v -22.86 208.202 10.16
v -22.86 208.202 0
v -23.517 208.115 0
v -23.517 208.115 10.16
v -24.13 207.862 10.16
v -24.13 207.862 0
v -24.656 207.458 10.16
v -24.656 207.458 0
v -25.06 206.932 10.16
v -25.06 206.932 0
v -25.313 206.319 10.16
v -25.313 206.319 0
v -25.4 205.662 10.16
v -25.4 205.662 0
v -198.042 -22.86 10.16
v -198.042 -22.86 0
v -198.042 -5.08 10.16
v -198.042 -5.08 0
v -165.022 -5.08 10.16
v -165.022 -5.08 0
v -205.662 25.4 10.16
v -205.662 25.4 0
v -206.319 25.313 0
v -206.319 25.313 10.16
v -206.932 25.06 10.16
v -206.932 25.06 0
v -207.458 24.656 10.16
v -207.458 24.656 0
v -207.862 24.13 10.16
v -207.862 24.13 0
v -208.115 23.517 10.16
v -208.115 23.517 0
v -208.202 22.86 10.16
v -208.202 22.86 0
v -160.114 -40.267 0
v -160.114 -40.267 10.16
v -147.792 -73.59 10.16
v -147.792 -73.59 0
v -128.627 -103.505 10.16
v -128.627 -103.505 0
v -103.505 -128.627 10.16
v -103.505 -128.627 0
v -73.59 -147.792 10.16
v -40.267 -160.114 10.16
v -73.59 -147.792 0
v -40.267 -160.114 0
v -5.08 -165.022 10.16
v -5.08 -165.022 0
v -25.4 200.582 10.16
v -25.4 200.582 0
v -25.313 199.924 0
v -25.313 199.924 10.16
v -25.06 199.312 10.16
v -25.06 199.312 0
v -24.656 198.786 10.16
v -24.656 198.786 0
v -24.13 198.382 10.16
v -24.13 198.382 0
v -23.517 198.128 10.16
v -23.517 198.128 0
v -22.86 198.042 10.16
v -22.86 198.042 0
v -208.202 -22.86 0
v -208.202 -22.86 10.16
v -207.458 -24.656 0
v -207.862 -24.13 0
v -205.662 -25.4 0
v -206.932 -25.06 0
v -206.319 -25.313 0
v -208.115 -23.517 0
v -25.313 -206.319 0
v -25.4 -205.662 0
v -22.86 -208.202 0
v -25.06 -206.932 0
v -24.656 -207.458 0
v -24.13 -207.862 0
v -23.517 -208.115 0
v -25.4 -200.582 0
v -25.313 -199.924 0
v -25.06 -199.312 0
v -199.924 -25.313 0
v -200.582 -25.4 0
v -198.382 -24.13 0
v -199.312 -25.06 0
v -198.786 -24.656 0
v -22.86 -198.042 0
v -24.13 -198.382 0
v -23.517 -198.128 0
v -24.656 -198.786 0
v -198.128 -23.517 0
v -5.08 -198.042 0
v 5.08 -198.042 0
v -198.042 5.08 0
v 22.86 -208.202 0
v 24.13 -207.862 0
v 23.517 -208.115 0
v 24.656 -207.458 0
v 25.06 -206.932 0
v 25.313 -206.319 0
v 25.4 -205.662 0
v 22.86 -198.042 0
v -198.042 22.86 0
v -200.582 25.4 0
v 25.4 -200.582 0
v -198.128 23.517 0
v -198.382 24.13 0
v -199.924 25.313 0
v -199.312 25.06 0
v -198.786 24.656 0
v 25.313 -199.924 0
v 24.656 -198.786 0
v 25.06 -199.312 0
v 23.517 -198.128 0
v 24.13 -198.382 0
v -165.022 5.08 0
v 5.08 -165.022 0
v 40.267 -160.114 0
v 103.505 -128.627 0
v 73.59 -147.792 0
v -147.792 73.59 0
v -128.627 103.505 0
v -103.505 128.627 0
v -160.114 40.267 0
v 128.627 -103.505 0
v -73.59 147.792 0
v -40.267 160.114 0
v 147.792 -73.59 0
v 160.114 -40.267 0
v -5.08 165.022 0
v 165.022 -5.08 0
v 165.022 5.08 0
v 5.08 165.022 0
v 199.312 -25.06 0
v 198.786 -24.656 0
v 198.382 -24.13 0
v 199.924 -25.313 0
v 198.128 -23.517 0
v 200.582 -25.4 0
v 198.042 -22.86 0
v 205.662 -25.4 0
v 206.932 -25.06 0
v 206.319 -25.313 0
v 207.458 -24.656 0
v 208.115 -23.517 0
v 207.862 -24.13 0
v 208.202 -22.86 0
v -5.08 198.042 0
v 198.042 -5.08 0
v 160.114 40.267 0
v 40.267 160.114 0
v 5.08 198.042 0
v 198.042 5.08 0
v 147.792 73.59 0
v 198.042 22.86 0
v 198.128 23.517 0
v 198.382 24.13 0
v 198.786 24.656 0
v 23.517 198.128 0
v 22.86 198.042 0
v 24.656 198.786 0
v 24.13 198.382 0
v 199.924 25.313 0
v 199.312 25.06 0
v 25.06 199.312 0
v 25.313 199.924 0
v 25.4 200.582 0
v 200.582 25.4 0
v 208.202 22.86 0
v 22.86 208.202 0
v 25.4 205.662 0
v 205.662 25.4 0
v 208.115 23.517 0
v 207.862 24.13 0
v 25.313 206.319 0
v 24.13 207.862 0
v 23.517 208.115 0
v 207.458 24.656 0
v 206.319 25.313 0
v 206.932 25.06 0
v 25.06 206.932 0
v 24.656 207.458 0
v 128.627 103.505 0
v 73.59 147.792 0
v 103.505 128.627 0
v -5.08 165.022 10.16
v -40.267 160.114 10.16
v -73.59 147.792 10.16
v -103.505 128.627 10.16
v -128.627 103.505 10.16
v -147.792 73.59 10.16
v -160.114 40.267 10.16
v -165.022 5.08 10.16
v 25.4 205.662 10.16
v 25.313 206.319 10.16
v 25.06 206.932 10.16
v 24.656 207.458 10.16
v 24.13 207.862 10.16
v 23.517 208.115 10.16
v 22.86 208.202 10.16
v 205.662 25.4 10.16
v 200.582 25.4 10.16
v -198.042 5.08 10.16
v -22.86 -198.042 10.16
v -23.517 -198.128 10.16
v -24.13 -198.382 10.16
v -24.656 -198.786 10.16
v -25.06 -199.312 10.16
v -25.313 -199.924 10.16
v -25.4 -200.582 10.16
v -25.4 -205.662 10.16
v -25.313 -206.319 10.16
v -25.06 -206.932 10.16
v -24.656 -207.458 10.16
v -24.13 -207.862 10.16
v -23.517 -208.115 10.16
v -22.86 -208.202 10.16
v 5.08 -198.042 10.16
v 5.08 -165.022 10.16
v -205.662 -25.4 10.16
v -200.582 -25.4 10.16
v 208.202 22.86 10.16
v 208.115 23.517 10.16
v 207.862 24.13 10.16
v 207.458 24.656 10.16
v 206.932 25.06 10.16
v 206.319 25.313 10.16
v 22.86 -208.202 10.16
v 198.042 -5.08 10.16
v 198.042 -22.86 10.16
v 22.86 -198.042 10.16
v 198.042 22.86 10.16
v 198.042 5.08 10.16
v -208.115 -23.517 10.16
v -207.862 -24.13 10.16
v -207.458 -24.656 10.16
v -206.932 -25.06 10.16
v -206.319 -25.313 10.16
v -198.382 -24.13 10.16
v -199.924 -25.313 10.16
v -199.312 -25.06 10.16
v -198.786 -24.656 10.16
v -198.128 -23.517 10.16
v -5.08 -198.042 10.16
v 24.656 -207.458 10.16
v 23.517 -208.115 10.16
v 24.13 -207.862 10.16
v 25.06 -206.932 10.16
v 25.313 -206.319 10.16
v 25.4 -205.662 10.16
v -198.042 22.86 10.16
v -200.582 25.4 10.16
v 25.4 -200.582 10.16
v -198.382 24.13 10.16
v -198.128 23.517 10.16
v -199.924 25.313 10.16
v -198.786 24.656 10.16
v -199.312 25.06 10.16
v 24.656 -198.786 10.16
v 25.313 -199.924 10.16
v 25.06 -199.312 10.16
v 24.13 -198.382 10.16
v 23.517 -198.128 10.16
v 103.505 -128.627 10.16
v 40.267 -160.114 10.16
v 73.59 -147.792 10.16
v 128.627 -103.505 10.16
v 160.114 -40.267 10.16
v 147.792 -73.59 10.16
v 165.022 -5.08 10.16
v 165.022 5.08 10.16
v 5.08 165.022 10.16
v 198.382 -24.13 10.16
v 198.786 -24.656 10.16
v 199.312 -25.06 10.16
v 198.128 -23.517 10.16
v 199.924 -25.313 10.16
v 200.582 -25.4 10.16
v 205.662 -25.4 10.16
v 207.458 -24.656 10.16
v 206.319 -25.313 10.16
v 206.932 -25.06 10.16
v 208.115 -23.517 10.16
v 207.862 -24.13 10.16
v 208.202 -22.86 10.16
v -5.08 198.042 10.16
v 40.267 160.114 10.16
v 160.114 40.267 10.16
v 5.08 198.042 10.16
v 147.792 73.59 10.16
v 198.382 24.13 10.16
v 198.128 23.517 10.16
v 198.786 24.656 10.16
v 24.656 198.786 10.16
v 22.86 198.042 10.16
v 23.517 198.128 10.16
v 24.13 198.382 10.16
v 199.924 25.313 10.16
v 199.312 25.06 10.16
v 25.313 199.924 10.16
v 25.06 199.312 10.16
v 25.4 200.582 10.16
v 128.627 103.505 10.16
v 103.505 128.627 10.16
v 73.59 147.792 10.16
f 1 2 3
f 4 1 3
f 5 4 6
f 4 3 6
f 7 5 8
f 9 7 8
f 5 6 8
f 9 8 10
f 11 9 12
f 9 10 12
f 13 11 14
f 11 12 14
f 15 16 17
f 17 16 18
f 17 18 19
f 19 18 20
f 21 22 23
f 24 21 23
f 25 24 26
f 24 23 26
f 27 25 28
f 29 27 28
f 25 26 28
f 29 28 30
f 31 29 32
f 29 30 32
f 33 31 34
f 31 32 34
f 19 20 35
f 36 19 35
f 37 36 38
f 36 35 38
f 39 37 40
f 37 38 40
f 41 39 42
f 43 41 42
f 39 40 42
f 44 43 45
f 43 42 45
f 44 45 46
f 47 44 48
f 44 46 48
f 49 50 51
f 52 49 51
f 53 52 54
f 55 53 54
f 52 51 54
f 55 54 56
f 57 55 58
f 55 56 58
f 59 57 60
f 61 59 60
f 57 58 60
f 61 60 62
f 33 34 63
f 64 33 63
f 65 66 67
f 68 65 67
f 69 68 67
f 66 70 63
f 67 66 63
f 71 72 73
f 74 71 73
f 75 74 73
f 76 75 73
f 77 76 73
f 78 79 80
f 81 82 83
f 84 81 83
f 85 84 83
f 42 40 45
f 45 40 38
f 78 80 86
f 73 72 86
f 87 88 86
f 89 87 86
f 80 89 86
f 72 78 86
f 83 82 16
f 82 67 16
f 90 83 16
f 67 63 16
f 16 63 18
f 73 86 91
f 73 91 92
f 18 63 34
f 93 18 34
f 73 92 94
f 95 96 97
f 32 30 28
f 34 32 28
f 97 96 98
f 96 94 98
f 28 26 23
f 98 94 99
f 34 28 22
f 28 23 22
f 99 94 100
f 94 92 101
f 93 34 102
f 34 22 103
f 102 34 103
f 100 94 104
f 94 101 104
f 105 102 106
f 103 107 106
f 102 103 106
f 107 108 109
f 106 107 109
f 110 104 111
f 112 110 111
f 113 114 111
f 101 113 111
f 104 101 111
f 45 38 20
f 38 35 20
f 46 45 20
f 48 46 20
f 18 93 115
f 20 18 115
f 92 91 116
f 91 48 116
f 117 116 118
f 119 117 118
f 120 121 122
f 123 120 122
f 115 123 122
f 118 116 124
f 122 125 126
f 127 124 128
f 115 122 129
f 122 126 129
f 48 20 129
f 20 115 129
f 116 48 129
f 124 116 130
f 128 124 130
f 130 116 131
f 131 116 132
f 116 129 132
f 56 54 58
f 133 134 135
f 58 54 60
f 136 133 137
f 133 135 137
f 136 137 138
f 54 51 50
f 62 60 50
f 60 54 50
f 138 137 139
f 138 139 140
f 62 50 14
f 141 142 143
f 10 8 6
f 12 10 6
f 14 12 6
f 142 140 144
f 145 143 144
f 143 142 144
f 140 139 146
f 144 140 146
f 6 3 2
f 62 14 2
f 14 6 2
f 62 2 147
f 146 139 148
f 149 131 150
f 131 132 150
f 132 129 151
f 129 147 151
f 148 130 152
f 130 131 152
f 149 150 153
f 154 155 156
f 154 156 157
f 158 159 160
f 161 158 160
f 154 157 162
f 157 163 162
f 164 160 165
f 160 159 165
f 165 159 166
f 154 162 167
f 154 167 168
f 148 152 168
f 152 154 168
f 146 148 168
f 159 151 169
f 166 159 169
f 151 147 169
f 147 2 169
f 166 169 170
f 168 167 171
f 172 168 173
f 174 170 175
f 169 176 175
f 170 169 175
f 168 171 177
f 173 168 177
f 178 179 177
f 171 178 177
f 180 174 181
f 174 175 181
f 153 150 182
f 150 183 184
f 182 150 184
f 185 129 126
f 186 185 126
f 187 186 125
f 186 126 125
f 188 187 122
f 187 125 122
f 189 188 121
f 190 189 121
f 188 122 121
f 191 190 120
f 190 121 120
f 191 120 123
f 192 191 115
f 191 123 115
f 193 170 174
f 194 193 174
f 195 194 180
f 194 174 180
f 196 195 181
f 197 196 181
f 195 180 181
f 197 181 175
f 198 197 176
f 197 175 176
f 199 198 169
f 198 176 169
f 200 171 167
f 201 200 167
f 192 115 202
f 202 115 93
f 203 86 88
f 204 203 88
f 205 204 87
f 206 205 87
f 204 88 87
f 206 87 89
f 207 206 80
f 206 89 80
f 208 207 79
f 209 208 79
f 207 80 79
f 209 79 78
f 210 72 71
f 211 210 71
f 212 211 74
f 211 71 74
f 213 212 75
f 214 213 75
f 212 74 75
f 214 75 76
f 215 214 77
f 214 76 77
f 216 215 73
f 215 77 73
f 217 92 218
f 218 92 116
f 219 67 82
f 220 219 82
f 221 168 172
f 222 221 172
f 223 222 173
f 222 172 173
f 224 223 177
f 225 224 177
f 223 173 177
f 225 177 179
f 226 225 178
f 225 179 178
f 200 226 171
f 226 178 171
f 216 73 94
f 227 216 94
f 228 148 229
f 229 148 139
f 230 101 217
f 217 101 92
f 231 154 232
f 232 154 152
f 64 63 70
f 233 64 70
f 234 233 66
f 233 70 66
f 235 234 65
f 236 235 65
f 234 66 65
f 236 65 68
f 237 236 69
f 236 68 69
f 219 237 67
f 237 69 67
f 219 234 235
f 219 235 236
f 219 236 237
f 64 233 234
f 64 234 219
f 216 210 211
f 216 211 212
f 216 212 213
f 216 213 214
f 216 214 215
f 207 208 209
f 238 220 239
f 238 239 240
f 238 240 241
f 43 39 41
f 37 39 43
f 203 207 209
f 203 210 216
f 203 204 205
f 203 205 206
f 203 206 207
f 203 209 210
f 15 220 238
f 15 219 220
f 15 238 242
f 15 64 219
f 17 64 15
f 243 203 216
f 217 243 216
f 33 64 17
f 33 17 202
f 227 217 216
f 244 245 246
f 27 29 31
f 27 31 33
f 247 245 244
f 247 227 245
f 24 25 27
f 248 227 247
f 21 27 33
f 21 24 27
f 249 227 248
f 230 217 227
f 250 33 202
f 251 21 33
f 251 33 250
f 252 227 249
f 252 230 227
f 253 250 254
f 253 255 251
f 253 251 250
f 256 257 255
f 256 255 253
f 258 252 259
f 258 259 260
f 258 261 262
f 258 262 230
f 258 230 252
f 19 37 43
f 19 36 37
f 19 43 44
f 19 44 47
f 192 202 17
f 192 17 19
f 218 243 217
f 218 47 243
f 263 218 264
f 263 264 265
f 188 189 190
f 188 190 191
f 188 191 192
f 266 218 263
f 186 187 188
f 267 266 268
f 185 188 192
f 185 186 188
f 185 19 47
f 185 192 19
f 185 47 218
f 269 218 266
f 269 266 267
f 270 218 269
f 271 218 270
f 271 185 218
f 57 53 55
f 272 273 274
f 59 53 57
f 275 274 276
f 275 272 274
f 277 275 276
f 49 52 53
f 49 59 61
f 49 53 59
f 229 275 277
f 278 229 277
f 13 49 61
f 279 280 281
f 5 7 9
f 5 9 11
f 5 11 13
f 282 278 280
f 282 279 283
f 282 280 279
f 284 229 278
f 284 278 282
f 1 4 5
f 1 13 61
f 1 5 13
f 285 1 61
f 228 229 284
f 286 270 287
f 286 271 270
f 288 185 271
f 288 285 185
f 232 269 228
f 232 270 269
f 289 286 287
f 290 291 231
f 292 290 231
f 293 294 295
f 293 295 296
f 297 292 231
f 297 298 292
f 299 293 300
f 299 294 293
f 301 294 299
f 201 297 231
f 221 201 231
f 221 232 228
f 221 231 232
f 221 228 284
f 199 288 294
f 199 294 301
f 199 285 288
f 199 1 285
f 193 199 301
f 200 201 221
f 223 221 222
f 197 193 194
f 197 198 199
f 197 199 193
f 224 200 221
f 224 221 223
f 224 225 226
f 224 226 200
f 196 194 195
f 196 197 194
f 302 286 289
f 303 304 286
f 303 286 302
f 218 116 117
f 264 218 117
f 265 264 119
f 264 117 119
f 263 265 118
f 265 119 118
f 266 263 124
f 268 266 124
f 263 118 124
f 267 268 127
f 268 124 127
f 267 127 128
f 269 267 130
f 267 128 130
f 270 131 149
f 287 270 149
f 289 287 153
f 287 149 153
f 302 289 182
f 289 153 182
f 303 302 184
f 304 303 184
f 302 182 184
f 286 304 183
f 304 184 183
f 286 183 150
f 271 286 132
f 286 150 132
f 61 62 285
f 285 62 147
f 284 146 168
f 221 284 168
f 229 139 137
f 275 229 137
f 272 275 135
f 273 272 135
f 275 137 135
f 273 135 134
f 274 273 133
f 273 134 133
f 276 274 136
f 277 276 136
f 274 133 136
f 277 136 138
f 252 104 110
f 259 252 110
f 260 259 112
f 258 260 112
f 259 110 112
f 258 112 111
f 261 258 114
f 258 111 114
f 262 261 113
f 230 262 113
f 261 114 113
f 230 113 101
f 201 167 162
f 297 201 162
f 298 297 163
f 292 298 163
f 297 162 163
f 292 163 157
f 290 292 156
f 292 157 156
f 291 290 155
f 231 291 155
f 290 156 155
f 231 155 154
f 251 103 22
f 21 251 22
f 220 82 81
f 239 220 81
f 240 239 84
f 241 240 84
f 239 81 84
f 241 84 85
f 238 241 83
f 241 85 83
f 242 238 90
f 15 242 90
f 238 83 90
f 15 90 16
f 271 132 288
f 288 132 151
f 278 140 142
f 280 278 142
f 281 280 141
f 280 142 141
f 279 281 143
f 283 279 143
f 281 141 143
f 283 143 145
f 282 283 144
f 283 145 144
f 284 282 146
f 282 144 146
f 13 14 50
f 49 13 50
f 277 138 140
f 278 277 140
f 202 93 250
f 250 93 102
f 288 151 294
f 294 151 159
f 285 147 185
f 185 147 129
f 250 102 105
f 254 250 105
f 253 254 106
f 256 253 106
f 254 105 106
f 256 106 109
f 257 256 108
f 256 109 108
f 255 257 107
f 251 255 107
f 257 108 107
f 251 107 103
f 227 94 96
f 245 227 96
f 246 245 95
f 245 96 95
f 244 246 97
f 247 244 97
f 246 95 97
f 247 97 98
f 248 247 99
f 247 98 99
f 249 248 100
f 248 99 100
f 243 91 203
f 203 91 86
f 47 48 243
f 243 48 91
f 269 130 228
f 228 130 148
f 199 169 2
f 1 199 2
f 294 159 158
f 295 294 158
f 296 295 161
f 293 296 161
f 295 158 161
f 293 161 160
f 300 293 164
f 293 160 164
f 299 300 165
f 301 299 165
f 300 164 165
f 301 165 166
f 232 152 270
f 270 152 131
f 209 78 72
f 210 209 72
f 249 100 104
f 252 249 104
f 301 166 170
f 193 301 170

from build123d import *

# Parameters (mm, degrees)
F1_DEPTH = 10.16


with BuildPart() as f1:
    # F0 (on Top) → F1 (new body)
    with BuildSketch(Plane.XY):
        with BuildLine():
            ThreePointArc((165.0218276471, -5.08), (165.080455755, -2.5403007163), (165.1, 0))
            ThreePointArc((165.1, 0), (165.080455755, 2.5403007163), (165.0218276471, 5.08))
            ThreePointArc((165.0218276471, 5.08), (116.7433295739, 116.7433295739), (5.08, 165.0218276471))
            ThreePointArc((5.08, 165.0218276471), (2.5403007163, 165.080455755), (0, 165.1))
            ThreePointArc((0, 165.1), (-2.5403007163, 165.080455755), (-5.08, 165.0218276471))
            ThreePointArc((-5.08, 165.0218276471), (-116.7433295739, 116.7433295739), (-165.0218276471, 5.08))
            ThreePointArc((-165.0218276471, 5.08), (-165.1, 0), (-165.0218276471, -5.08))
            ThreePointArc((-165.0218276471, -5.08), (-116.7433295739, -116.7433295739), (-5.08, -165.0218276471))
            ThreePointArc((-5.08, -165.0218276471), (0, -165.1), (5.08, -165.0218276471))
            ThreePointArc((5.08, -165.0218276471), (116.7433295739, -116.7433295739), (165.0218276471, -5.08))
        make_face()
        with BuildLine():
            ThreePointArc((165.0218276471, 5.08), (165.080455755, 2.5403007163), (165.1, 0))
            ThreePointArc((165.1, 0), (165.080455755, -2.5403007163), (165.0218276471, -5.08))
            Line((165.0218276471, -5.08), (198.0418276471, -5.08))
            Line((198.0418276471, -5.08), (198.0418276471, 5.08))
            Line((198.0418276471, 5.08), (165.0218276471, 5.08))
        make_face()
        with BuildLine():
            ThreePointArc((0, 165.1), (2.5403007163, 165.080455755), (5.08, 165.0218276471))
            Line((5.08, 165.0218276471), (5.08, 198.0418276471))
            Line((5.08, 198.0418276471), (-5.08, 198.0418276471))
            Line((-5.08, 198.0418276471), (-5.08, 165.0218276471))
            ThreePointArc((-5.08, 165.0218276471), (-2.5403007163, 165.080455755), (0, 165.1))
        make_face()
        with BuildLine():
            Line((198.0418276471, 22.86), (198.0418276471, 5.08))
            Line((198.0418276471, 5.08), (203.1218276471, 5.08))
            ThreePointArc((203.1218276471, 5.08), (206.713930094, 3.59210245), (208.2018276471, 4.5e-09))
            Line((208.2018276471, 4.5e-09), (208.2018276471, 22.86))
            ThreePointArc((208.2018276471, 22.86), (207.4578788713, 24.6560512242), (205.6618276471, 25.4))
            Line((205.6618276471, 25.4), (200.5818276471, 25.4))
            ThreePointArc((200.5818276471, 25.4), (198.7857764229, 24.6560512242), (198.0418276471, 22.86))
        make_face()
        with BuildLine():
            Line((203.1218276471, 5.08), (198.0418276471, 5.08))
            Line((198.0418276471, 5.08), (198.0418276471, -5.08))
            Line((198.0418276471, -5.08), (203.1218276471, -5.08))
            ThreePointArc((203.1218276471, -5.08), (206.7139300971, -3.5921024468), (208.2018276471, 4.5e-09))
            ThreePointArc((208.2018276471, 4.5e-09), (206.713930094, 3.59210245), (203.1218276471, 5.08))
        make_face()
        with BuildLine():
            Line((5.08, -198.0418276471), (5.08, -165.0218276471))
            ThreePointArc((5.08, -165.0218276471), (0, -165.1), (-5.08, -165.0218276471))
            Line((-5.08, -165.0218276471), (-5.08, -198.0418276471))
            Line((-5.08, -198.0418276471), (5.08, -198.0418276471))
        make_face()
        with BuildLine():
            Line((203.1218276471, -5.08), (198.0418276471, -5.08))
            Line((198.0418276471, -5.08), (198.0418276471, -22.86))
            ThreePointArc((198.0418276471, -22.86), (198.7857764229, -24.6560512242), (200.5818276471, -25.4))
            Line((200.5818276471, -25.4), (205.6618276471, -25.4))
            ThreePointArc((205.6618276471, -25.4), (207.4578788713, -24.6560512242), (208.2018276471, -22.86))
            Line((208.2018276471, -22.86), (208.2018276471, 4.5e-09))
            ThreePointArc((208.2018276471, 4.5e-09), (206.7139300971, -3.5921024468), (203.1218276471, -5.08))
        make_face()
        with BuildLine():
            Line((-5.08, 198.0418276471), (5.08, 198.0418276471))
            Line((5.08, 198.0418276471), (5.08, 203.1218276471))
            ThreePointArc((5.08, 203.1218276471), (3.5921024559, 206.713930088), (2.13e-08, 208.2018276471))
            ThreePointArc((2.13e-08, 208.2018276471), (-3.5921024409, 206.7139301031), (-5.08, 203.1218276471))
            Line((-5.08, 203.1218276471), (-5.08, 198.0418276471))
        make_face()
        with BuildLine():
            Line((5.08, 203.1218276471), (5.08, 198.0418276471))
            Line((5.08, 198.0418276471), (22.86, 198.0418276471))
            ThreePointArc((22.86, 198.0418276471), (24.6560512242, 198.7857764229), (25.4, 200.5818276471))
            Line((25.4, 200.5818276471), (25.4, 205.6618276471))
            ThreePointArc((25.4, 205.6618276471), (24.6560512242, 207.4578788713), (22.86, 208.2018276471))
            Line((22.86, 208.2018276471), (2.13e-08, 208.2018276471))
            ThreePointArc((2.13e-08, 208.2018276471), (3.5921024559, 206.713930088), (5.08, 203.1218276471))
        make_face()
        with BuildLine():
            Line((22.86, -198.0418276471), (5.08, -198.0418276471))
            Line((5.08, -198.0418276471), (5.08, -203.1218276471))
            ThreePointArc((5.08, -203.1218276471), (3.5921024559, -206.713930088), (2.13e-08, -208.2018276471))
            Line((2.13e-08, -208.2018276471), (22.86, -208.2018276471))
            ThreePointArc((22.86, -208.2018276471), (24.6560512242, -207.4578788713), (25.4, -205.6618276471))
            Line((25.4, -205.6618276471), (25.4, -200.5818276471))
            ThreePointArc((25.4, -200.5818276471), (24.6560512242, -198.7857764229), (22.86, -198.0418276471))
        make_face()
        with BuildLine():
            Line((5.08, -203.1218276471), (5.08, -198.0418276471))
            Line((5.08, -198.0418276471), (-5.08, -198.0418276471))
            Line((-5.08, -198.0418276471), (-5.08, -203.1218276471))
            ThreePointArc((-5.08, -203.1218276471), (-3.5921024409, -206.7139301031), (2.13e-08, -208.2018276471))
            ThreePointArc((2.13e-08, -208.2018276471), (3.5921024559, -206.713930088), (5.08, -203.1218276471))
        make_face()
        with BuildLine():
            Line((-22.86, 198.0418276471), (-5.08, 198.0418276471))
            Line((-5.08, 198.0418276471), (-5.08, 203.1218276471))
            ThreePointArc((-5.08, 203.1218276471), (-3.5921024409, 206.7139301031), (2.13e-08, 208.2018276471))
            Line((2.13e-08, 208.2018276471), (-22.86, 208.2018276471))
            ThreePointArc((-22.86, 208.2018276471), (-24.6560512242, 207.4578788713), (-25.4, 205.6618276471))
            Line((-25.4, 205.6618276471), (-25.4, 200.5818276471))
            ThreePointArc((-25.4, 200.5818276471), (-24.6560512242, 198.7857764229), (-22.86, 198.0418276471))
        make_face()
        with BuildLine():
            Line((-198.0418276471, -5.08), (-165.0218276471, -5.08))
            ThreePointArc((-165.0218276471, -5.08), (-165.1, 0), (-165.0218276471, 5.08))
            Line((-165.0218276471, 5.08), (-198.0418276471, 5.08))
            Line((-198.0418276471, 5.08), (-198.0418276471, -5.08))
        make_face()
        with BuildLine():
            Line((-5.08, -203.1218276471), (-5.08, -198.0418276471))
            Line((-5.08, -198.0418276471), (-22.86, -198.0418276471))
            ThreePointArc((-22.86, -198.0418276471), (-24.6560512242, -198.7857764229), (-25.4, -200.5818276471))
            Line((-25.4, -200.5818276471), (-25.4, -205.6618276471))
            ThreePointArc((-25.4, -205.6618276471), (-24.6560512242, -207.4578788713), (-22.86, -208.2018276471))
            Line((-22.86, -208.2018276471), (2.13e-08, -208.2018276471))
            ThreePointArc((2.13e-08, -208.2018276471), (-3.5921024409, -206.7139301031), (-5.08, -203.1218276471))
        make_face()
        with BuildLine():
            Line((-198.0418276471, -22.86), (-198.0418276471, -5.08))
            Line((-198.0418276471, -5.08), (-203.1218276471, -5.08))
            ThreePointArc((-203.1218276471, -5.08), (-206.7139300971, -3.5921024468), (-208.2018276471, 4.5e-09))
            Line((-208.2018276471, 4.5e-09), (-208.2018276471, -22.86))
            ThreePointArc((-208.2018276471, -22.86), (-207.4578788713, -24.6560512242), (-205.6618276471, -25.4))
            Line((-205.6618276471, -25.4), (-200.5818276471, -25.4))
            ThreePointArc((-200.5818276471, -25.4), (-198.7857764229, -24.6560512242), (-198.0418276471, -22.86))
        make_face()
        with BuildLine():
            Line((-203.1218276471, -5.08), (-198.0418276471, -5.08))
            Line((-198.0418276471, -5.08), (-198.0418276471, 5.08))
            Line((-198.0418276471, 5.08), (-203.1218276471, 5.08))
            ThreePointArc((-203.1218276471, 5.08), (-206.713930094, 3.59210245), (-208.2018276471, 4.5e-09))
            ThreePointArc((-208.2018276471, 4.5e-09), (-206.7139300971, -3.5921024468), (-203.1218276471, -5.08))
        make_face()
        with BuildLine():
            Line((-203.1218276471, 5.08), (-198.0418276471, 5.08))
            Line((-198.0418276471, 5.08), (-198.0418276471, 22.86))
            ThreePointArc((-198.0418276471, 22.86), (-198.7857764229, 24.6560512242), (-200.5818276471, 25.4))
            Line((-200.5818276471, 25.4), (-205.6618276471, 25.4))
            ThreePointArc((-205.6618276471, 25.4), (-207.4578788713, 24.6560512242), (-208.2018276471, 22.86))
            Line((-208.2018276471, 22.86), (-208.2018276471, 4.5e-09))
            ThreePointArc((-208.2018276471, 4.5e-09), (-206.713930094, 3.59210245), (-203.1218276471, 5.08))
        make_face()
    extrude(amount=F1_DEPTH)


solid = f1.part
